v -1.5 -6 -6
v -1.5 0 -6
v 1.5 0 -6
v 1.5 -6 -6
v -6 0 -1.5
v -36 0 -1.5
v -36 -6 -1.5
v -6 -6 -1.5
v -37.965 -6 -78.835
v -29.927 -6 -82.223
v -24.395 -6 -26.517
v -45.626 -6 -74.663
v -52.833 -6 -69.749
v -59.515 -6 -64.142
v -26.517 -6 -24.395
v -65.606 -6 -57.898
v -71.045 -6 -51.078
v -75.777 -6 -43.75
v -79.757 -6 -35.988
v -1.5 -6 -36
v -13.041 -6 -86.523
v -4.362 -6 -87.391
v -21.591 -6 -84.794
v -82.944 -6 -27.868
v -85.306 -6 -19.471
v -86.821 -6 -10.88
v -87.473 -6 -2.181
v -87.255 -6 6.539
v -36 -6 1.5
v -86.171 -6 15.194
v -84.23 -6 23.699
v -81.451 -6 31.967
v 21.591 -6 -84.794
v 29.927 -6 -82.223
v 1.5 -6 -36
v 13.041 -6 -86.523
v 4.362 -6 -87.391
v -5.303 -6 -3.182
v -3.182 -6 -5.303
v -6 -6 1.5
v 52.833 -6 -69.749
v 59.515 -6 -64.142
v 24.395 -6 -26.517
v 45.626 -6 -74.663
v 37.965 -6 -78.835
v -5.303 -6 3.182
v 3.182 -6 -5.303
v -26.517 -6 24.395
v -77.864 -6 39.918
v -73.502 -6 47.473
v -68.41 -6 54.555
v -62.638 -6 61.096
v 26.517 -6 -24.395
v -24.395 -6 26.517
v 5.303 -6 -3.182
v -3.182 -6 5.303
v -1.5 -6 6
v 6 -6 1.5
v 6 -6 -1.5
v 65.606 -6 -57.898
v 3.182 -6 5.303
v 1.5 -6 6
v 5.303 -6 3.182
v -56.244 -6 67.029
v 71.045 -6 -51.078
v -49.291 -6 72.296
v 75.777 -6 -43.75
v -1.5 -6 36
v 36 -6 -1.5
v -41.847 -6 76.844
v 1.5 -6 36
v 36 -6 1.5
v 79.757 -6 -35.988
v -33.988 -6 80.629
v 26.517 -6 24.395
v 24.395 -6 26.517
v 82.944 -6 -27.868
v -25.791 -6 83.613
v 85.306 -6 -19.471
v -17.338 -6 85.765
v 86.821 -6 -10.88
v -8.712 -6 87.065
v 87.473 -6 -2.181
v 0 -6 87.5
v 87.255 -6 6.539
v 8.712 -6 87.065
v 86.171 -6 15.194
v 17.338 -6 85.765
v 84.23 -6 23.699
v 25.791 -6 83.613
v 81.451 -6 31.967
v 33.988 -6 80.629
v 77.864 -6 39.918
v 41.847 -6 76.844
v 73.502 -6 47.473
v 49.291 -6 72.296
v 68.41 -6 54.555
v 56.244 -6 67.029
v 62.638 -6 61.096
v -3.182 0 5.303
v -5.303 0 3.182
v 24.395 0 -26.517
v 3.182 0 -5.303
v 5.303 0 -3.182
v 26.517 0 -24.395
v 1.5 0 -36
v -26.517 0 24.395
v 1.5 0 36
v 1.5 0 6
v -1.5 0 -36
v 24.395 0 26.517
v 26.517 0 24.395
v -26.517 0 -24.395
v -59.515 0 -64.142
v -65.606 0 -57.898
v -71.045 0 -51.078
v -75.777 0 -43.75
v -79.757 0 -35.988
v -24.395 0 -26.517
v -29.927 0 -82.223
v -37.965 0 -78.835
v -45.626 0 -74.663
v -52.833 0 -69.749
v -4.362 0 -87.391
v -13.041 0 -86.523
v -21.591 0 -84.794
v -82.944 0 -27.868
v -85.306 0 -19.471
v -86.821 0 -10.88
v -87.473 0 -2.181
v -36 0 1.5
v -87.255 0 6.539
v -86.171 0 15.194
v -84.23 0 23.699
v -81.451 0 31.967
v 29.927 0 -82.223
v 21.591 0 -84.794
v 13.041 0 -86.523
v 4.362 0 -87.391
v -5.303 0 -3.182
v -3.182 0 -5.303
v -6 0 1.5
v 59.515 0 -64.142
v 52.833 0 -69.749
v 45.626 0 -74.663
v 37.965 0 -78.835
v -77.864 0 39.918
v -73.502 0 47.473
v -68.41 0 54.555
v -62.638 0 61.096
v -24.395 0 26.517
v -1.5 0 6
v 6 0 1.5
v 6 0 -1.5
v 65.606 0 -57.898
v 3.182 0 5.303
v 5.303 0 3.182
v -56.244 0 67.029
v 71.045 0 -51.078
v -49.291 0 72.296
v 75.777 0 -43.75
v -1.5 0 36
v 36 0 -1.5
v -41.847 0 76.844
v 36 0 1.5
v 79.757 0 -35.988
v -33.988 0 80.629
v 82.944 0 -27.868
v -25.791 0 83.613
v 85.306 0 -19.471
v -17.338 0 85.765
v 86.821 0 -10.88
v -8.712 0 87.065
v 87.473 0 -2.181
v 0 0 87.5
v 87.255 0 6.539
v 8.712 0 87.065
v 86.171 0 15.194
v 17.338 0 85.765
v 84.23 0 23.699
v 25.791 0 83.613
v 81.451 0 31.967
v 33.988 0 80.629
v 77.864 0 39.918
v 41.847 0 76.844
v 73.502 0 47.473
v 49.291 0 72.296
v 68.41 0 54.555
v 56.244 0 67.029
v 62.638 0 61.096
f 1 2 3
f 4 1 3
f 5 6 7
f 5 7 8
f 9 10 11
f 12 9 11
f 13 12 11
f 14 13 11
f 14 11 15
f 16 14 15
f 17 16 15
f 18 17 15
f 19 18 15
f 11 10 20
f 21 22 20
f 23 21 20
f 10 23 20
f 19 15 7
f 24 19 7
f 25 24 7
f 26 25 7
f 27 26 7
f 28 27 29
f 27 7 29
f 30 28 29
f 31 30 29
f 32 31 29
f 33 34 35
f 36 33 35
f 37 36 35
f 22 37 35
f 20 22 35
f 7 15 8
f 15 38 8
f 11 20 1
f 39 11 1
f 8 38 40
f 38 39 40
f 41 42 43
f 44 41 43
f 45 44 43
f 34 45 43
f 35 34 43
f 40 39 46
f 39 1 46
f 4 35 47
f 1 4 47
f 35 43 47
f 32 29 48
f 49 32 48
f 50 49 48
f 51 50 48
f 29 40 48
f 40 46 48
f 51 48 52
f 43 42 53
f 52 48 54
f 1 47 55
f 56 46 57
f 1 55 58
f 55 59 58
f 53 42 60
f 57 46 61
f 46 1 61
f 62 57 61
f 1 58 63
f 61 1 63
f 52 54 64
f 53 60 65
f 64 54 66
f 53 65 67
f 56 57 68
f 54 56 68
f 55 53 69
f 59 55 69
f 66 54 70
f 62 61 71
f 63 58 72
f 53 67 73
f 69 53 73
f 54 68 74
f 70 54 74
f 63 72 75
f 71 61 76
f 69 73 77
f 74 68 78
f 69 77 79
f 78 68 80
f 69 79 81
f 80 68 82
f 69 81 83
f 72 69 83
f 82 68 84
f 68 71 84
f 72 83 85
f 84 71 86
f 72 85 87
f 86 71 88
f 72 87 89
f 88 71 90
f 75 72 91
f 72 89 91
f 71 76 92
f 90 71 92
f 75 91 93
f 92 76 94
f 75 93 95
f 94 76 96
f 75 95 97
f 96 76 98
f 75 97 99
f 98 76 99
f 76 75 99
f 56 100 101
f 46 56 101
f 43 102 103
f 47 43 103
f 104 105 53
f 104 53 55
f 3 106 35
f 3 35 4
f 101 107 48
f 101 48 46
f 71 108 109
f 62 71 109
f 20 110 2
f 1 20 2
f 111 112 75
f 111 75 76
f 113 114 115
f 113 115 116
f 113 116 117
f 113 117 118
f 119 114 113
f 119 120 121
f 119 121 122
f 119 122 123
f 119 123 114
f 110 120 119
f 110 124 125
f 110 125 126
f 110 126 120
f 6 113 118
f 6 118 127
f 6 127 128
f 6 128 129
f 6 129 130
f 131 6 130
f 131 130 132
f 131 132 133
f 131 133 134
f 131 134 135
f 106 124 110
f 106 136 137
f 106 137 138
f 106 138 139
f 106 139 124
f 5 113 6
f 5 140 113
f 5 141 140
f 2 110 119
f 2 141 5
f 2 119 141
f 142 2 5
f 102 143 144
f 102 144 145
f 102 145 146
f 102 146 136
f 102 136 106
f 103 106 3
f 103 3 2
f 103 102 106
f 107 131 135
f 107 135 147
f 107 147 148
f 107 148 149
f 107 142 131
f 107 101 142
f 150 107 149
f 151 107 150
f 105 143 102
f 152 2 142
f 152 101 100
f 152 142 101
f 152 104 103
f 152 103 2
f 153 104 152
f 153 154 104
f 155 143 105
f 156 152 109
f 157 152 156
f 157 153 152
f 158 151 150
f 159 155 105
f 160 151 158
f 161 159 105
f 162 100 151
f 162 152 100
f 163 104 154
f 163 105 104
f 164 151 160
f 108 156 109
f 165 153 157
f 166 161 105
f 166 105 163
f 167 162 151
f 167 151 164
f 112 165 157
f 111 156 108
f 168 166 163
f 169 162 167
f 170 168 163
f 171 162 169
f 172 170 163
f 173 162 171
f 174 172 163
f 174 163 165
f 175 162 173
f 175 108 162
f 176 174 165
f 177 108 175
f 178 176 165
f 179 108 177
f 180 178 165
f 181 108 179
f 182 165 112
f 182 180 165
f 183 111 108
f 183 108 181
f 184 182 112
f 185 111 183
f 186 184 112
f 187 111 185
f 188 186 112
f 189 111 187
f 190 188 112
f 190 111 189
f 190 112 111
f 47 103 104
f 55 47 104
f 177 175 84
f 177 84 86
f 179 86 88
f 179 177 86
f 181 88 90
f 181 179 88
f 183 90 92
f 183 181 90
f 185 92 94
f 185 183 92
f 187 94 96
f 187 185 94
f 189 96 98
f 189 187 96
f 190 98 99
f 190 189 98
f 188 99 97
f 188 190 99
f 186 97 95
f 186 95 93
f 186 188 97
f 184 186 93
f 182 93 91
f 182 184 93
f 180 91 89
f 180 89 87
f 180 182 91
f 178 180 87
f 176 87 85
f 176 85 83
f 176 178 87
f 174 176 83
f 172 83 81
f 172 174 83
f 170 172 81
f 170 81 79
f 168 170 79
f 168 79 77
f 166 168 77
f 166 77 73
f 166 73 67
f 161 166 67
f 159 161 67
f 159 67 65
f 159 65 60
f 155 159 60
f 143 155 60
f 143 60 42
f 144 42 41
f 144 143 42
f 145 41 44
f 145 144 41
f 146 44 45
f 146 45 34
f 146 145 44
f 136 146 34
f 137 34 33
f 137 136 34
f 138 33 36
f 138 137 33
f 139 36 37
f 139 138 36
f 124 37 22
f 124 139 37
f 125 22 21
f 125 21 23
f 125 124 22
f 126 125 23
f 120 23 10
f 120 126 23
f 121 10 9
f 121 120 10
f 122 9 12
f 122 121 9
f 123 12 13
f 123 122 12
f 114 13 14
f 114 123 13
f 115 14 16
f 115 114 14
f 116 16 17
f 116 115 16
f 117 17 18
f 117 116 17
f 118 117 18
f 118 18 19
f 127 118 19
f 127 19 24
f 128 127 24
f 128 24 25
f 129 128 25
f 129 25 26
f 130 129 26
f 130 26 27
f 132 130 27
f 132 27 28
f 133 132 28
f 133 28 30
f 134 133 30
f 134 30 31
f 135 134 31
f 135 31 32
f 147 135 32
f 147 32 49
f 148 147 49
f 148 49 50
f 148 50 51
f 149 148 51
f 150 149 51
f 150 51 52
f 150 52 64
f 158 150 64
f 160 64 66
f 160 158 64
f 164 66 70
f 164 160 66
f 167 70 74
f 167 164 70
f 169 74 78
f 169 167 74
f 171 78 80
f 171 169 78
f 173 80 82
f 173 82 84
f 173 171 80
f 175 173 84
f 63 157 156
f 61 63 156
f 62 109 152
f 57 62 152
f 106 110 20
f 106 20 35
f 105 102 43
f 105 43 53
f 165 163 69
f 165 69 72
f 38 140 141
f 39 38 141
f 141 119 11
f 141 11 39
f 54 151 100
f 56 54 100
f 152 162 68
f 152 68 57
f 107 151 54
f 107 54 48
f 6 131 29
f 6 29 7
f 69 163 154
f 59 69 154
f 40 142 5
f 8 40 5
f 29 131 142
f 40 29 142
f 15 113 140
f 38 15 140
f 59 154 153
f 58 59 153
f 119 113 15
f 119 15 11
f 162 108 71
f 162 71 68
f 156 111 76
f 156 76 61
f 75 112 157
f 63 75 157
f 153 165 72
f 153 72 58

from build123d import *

# Parameters (mm, degrees)
SKETCH1_R          = 87.5
BASE_FLANGE1_DEPTH = 6
SKETCH4_W          = 30
SKETCH4_H          = 3
CUT_EXTRUDE1_DEPTH = 10
CIRPATTERN1_COUNT  = 8


# Sheet-metal steps are written as plain solids
with BuildPart() as part:
    # Sketch1 → Base-Flange1 (new body)
    with BuildSketch(Plane(origin=(0, 0, 0), x_dir=(1, 0, 0), z_dir=(0, 1, 0))):
        with Locations(Location((0, 0, 0), (0, 0, 270))):
            Circle(SKETCH1_R)
    extrude(amount=-BASE_FLANGE1_DEPTH)

    # Sketch4 → Cut-Extrude1 (cut)
    with BuildSketch(Plane(origin=(0, 0, 0), x_dir=(1, 0, 0), z_dir=(0, 1, 0))):
        with Locations((-21, 0)):
            Rectangle(SKETCH4_W, SKETCH4_H)
    cut_extrude1 = extrude(amount=-CUT_EXTRUDE1_DEPTH, mode=Mode.SUBTRACT)

    # CirPattern1: Cut-Extrude1 ×8 about axis
    cirpattern1_axis = Axis((0, 0, 0), (0, 1, 0))
    for i in range(1, CIRPATTERN1_COUNT):
        add(cut_extrude1.rotate(cirpattern1_axis, i * 360 / CIRPATTERN1_COUNT), mode=Mode.SUBTRACT)


solid = part.part
